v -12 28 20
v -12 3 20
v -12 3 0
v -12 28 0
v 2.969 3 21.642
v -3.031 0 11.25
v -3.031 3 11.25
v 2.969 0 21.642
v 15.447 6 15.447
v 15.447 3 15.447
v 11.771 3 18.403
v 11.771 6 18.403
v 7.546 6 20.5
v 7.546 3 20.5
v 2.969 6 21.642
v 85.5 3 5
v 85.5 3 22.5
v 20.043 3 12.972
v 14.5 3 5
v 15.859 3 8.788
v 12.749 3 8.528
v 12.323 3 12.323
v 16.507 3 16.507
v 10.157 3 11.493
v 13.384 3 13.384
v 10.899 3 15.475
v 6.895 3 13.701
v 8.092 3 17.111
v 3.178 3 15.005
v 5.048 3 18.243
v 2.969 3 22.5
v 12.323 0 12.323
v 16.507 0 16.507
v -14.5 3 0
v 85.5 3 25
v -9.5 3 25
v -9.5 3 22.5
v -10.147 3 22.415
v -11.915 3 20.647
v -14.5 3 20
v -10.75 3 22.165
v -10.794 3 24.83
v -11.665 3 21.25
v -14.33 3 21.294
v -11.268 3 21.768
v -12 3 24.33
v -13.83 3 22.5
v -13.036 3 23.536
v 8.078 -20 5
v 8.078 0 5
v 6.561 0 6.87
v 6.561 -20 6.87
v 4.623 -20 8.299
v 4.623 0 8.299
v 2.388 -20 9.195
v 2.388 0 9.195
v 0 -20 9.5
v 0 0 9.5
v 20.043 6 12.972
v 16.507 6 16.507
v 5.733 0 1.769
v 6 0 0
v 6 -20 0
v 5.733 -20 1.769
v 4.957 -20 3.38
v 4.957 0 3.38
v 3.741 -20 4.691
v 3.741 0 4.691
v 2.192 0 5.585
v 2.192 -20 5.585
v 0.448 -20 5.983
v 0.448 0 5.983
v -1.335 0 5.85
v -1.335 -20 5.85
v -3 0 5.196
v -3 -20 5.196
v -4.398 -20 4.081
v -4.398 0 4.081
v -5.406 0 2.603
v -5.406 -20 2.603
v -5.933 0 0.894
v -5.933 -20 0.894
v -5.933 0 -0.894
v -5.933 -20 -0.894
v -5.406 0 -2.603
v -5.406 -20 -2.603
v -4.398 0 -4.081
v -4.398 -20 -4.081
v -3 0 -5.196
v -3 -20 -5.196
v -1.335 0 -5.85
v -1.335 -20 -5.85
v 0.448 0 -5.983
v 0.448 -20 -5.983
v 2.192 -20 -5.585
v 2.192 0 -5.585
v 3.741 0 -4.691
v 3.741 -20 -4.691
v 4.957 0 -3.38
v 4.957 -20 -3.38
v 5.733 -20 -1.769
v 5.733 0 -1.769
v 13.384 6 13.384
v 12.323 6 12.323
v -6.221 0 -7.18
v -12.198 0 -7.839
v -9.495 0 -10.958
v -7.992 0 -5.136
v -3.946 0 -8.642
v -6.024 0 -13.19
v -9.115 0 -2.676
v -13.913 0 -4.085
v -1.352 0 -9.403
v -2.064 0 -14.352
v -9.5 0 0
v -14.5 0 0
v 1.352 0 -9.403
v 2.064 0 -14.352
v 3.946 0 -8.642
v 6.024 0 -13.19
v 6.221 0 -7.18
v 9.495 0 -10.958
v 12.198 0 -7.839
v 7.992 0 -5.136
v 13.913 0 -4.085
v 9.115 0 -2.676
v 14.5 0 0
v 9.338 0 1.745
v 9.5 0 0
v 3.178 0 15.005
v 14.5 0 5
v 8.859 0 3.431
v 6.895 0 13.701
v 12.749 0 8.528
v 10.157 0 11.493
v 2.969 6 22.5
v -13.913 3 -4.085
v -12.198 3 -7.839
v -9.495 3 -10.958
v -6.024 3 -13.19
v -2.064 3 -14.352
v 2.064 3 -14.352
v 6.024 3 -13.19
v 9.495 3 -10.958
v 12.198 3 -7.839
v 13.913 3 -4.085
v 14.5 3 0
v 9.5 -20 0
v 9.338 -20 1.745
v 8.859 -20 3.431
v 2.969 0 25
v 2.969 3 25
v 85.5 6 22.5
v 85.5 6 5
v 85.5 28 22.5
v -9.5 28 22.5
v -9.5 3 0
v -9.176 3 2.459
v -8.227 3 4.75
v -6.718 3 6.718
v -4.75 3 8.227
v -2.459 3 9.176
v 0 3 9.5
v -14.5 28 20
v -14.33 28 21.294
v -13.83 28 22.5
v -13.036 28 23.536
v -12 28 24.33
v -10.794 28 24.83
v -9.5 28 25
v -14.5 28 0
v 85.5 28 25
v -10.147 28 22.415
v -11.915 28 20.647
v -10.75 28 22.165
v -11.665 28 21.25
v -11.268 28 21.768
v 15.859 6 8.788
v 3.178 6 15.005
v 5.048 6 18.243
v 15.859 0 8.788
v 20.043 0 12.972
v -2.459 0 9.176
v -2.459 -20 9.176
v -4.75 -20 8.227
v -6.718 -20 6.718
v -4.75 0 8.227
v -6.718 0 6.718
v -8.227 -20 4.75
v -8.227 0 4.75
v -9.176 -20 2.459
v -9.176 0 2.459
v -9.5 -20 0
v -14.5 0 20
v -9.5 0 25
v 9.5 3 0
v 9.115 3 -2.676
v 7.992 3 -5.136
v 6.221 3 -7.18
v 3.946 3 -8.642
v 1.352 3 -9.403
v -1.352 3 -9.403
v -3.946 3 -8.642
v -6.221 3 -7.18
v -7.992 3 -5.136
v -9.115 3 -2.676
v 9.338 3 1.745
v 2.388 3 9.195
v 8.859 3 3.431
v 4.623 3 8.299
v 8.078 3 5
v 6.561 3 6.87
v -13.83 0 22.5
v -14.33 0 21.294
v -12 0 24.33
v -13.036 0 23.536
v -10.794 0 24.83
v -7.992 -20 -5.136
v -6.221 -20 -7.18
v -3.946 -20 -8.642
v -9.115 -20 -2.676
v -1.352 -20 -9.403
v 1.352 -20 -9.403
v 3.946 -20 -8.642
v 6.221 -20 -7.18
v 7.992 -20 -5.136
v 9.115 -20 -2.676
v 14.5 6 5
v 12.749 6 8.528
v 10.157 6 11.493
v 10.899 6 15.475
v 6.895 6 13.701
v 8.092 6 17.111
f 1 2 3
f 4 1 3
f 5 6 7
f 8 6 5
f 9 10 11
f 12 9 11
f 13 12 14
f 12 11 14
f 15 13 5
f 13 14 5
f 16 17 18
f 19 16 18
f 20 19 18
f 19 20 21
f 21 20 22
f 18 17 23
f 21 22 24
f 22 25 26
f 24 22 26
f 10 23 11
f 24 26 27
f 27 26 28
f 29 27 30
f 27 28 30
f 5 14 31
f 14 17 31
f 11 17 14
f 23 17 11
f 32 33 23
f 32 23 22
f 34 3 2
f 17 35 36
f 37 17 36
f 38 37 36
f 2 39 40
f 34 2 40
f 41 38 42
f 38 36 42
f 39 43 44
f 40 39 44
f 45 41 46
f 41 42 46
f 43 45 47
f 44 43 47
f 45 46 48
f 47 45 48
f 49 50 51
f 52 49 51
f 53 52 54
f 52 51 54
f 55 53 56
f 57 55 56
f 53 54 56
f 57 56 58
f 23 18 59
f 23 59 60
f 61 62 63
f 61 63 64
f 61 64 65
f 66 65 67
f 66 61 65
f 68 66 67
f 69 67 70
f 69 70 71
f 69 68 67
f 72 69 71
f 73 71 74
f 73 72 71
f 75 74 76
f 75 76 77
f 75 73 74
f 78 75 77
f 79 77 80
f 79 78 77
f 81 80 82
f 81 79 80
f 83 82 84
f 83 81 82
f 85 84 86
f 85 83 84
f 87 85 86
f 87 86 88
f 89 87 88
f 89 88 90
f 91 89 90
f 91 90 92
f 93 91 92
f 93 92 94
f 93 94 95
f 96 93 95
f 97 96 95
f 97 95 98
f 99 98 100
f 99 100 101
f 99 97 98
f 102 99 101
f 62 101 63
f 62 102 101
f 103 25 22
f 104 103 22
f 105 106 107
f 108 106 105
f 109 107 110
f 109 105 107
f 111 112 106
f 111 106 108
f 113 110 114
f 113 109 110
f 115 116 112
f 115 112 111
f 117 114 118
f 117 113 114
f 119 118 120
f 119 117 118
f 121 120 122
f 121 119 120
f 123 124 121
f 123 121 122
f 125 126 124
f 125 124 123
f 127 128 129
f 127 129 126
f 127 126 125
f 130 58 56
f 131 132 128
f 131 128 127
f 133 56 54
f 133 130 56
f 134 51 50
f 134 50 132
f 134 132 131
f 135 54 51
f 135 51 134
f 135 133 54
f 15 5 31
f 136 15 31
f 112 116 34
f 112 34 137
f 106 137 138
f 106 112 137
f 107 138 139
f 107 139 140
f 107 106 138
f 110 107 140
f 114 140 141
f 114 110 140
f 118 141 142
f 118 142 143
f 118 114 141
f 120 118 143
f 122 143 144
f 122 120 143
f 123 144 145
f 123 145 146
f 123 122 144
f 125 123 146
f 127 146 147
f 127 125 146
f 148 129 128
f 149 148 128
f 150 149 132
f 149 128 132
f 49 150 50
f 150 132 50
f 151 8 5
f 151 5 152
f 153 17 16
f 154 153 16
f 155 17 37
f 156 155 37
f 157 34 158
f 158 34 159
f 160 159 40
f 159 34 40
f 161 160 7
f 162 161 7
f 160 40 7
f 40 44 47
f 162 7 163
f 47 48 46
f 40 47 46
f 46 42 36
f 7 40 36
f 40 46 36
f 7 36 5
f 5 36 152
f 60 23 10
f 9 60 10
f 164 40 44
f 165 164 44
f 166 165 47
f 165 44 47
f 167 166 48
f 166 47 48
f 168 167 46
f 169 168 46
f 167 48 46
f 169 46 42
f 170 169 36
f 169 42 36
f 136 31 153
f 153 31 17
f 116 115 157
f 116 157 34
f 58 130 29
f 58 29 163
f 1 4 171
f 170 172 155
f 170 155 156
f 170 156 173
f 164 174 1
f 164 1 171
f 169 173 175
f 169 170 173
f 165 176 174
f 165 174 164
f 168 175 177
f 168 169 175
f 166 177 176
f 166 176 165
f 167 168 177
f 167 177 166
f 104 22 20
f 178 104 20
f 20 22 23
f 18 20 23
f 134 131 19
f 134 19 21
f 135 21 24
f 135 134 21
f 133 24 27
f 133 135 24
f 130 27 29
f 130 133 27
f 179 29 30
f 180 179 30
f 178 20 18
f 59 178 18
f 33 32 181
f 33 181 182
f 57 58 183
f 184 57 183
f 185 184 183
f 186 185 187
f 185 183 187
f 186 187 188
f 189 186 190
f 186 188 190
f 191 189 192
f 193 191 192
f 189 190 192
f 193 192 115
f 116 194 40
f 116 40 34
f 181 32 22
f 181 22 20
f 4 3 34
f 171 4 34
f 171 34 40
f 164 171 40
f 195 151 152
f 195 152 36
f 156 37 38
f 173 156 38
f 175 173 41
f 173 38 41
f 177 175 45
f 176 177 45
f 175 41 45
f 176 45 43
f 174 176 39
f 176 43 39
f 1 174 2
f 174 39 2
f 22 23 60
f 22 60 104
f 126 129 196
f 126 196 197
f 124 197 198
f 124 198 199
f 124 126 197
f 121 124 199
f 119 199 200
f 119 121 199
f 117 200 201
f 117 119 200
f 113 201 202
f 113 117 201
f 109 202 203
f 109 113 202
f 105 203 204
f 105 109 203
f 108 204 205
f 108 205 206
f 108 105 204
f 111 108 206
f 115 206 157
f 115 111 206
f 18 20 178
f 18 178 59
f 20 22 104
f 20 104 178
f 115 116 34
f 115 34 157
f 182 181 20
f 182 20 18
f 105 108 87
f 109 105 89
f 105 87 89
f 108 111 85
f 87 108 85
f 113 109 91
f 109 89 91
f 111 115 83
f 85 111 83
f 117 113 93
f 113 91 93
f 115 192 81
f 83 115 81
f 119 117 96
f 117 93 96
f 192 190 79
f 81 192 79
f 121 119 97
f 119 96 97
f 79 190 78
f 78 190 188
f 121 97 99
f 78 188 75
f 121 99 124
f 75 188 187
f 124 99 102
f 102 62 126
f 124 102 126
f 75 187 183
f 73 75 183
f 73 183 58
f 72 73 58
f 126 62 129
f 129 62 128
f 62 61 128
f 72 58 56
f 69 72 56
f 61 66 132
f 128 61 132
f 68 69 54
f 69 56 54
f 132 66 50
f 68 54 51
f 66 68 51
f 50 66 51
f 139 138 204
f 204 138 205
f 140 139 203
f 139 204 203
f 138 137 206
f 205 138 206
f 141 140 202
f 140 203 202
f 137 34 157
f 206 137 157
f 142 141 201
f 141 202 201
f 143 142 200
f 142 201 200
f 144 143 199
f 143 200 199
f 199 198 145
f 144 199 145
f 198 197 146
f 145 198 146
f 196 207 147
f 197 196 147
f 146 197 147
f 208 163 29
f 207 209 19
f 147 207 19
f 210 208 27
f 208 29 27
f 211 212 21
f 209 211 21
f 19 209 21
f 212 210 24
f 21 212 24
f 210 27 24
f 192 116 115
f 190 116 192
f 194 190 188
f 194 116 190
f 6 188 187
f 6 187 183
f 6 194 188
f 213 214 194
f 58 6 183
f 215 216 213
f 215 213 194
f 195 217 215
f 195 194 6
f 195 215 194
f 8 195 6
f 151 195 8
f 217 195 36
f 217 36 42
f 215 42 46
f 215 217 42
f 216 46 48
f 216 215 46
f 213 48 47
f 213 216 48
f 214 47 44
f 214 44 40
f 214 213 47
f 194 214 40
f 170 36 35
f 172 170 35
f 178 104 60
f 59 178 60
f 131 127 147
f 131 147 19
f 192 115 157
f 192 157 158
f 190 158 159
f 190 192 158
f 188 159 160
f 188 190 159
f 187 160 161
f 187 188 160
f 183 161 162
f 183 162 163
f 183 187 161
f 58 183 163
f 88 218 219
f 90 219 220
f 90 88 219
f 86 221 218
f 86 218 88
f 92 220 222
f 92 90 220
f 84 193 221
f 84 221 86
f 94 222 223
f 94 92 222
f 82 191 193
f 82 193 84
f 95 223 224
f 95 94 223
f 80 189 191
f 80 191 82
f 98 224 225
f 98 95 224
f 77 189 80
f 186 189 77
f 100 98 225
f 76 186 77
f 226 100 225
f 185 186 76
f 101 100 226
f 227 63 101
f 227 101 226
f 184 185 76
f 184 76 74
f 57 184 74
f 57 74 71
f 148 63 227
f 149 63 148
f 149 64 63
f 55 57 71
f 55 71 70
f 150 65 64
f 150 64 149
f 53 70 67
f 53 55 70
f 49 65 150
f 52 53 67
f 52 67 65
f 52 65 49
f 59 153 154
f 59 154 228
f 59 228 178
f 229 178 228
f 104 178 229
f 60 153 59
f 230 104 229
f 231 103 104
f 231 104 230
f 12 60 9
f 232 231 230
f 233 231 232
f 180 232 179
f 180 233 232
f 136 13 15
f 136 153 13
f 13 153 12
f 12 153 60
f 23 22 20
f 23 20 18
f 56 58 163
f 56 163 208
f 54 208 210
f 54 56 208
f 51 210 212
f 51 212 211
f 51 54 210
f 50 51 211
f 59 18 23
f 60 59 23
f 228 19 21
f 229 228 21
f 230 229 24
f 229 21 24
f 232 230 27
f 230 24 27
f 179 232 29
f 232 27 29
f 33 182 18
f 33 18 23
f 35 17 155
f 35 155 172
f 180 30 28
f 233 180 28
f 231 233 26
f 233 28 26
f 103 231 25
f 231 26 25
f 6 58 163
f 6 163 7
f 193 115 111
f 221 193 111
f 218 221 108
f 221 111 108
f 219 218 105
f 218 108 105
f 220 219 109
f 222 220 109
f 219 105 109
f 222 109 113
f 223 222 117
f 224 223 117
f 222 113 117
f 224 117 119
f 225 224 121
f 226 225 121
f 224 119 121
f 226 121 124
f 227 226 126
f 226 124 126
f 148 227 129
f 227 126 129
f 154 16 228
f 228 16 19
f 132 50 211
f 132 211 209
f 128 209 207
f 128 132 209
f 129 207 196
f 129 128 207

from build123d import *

# Parameters (mm, degrees)
F0_R     = 6
F1_DEPTH = 20
F2_DEPTH = 3
F3_DEPTH = 3
F4_DEPTH = 3
F6_DEPTH = 3
F5_W     = 82.5310889132
F5_H     = 2.5
F7_DEPTH = 25
F8_DEPTH = 3


with BuildPart() as f1:
    # F0 (on Front) → F1 (new body)
    with BuildSketch(Plane.XZ):
        with BuildLine():
            ThreePointArc((-9.5, 0), (0, -9.5), (9.5, 0))
            ThreePointArc((9.5, 0), (9.1375215048, 2.5991730895), (8.0777472107, 5))
            ThreePointArc((8.0777472107, 5), (4.6233105022, 8.2990963363), (0, 9.5))
            ThreePointArc((0, 9.5), (-6.7175144213, 6.7175144213), (-9.5, 0))
        make_face()
        Circle(F0_R, mode=Mode.SUBTRACT)
    extrude(amount=F1_DEPTH)


with BuildPart() as f2:
    # F0 (on Front) → F2 (new body)
    with BuildSketch(Plane.XZ):
        with BuildLine():
            ThreePointArc((0, 9.5), (4.6233105022, 8.2990963363), (8.0777472107, 5))
            Line((8.0777472107, 5), (14.5, 5))
            ThreePointArc((14.5, 5), (10.1565341451, 11.493250809), (3.17828409, 15.0049495248))
            Line((3.17828409, 15.0049495248), (0, 9.5))
        make_face()
        with BuildLine():
            ThreePointArc((8.0777472107, 5), (9.1375215048, 2.5991730895), (9.5, 0))
            ThreePointArc((9.5, 0), (0, -9.5), (-9.5, 0))
            Line((-9.5, 0), (-14.5, 0))
            ThreePointArc((-14.5, 0), (0, -14.5), (14.5, 0))
            Line((14.5, 0), (14.5, 5))
            Line((14.5, 5), (8.0777472107, 5))
        make_face()
    extrude(amount=-F2_DEPTH)


with BuildPart() as f3:
    # F0 (on Front) → F3 (new body)
    with BuildSketch(Plane.XZ):
        with BuildLine():
            Line((-14.5, 0), (-9.5, 0))
            ThreePointArc((-9.5, 0), (-6.7175144213, 6.7175144213), (0, 9.5))
            Line((0, 9.5), (-3.0310889132, 11.25))
            Line((-3.0310889132, 11.25), (2.9689110868, 21.6423048454))
            Line((2.9689110868, 21.6423048454), (2.9689110868, 25))
            Line((2.9689110868, 25), (-9.5, 25))
            ThreePointArc((-9.5, 25), (-13.0355339059, 23.5355339059), (-14.5, 20))
            Line((-14.5, 20), (-14.5, 0))
        make_face()
    extrude(amount=-F3_DEPTH)


with BuildPart() as f4:
    # F0 (on Front) → F4 (new body, through all)
    with BuildSketch(Plane.XZ):
        Polygon((16.5074040368, 16.5074040368), (15.446743865, 15.446743865), (13.3841301067, 13.3841301067), (12.3234699349, 12.3234699349), (15.8590038409, 8.787936029), (20.0429379427, 12.9718701309), align=None)
    extrude(amount=-F4_DEPTH)


with BuildPart() as f6:
    # F5 (on face) → F6 (new body)
    with BuildSketch(Plane(origin=(0, 3, 0), x_dir=(-1, 0, 0), z_dir=(0, 1, 0))):
        with BuildLine():
            ThreePointArc((-14.5, 5), (-10.1565341451, 11.493250809), (-3.17828409, 15.0049495248))
            Line((-3.17828409, 15.0049495248), (-5.0475388851, 18.2425938021))
            ThreePointArc((-5.0475388851, 18.2425938021), (-9.5306228981, 16.3535043523), (-13.3841301067, 13.3841301067))
            Line((-13.3841301067, 13.3841301067), (-12.3234699349, 12.3234699349))
            Line((-12.3234699349, 12.3234699349), (-15.8590038409, 8.787936029))
            Line((-15.8590038409, 8.787936029), (-20.0429379427, 12.9718701309))
            Line((-20.0429379427, 12.9718701309), (-16.5074040368, 16.5074040368))
            Line((-16.5074040368, 16.5074040368), (-15.446743865, 15.446743865))
            ThreePointArc((-15.446743865, 15.446743865), (-9.7149539778, 19.5658749171), (-2.9689110868, 21.6423048454))
            Line((-2.9689110868, 21.6423048454), (-2.9689110868, 22.5))
            Line((-2.9689110868, 22.5), (-85.5, 22.5))
            Line((-85.5, 22.5), (-85.5, 5))
            Line((-85.5, 5), (-14.5, 5))
        make_face()
    extrude(amount=F6_DEPTH)


with BuildPart() as f7:
    # F5 (on face) → F7 (new body)
    with BuildSketch(Plane(origin=(0, 3, 0), x_dir=(-1, 0, 0), z_dir=(0, 1, 0))):
        with Locations((-44.2344555434, 23.75)):
            Rectangle(F5_W, F5_H)
        with BuildLine():
            Line((-2.9689110868, 25), (-2.9689110868, 22.5))
            Line((-2.9689110868, 22.5), (9.5, 22.5))
            ThreePointArc((9.5, 22.5), (11.267766953, 21.767766953), (12, 20))
            Line((12, 20), (12, 0))
            Line((12, 0), (14.5, 0))
            Line((14.5, 0), (14.5, 20))
            ThreePointArc((14.5, 20), (13.0355339059, 23.5355339059), (9.5, 25))
            Line((9.5, 25), (-2.9689110868, 25))
        make_face()
    extrude(amount=F7_DEPTH)


with BuildPart() as f8:
    # F8 (new, through all): a face of the model
    f8_faces = [f4.part.faces().sort_by_distance(p)[0] for p in [
        (16.1832039388, 3, 12.6476700329),
    ]]
    extrude(f8_faces, amount=F8_DEPTH)


solid = Compound([f1.part, f2.part, f3.part, f4.part, f6.part, f7.part, f8.part])
